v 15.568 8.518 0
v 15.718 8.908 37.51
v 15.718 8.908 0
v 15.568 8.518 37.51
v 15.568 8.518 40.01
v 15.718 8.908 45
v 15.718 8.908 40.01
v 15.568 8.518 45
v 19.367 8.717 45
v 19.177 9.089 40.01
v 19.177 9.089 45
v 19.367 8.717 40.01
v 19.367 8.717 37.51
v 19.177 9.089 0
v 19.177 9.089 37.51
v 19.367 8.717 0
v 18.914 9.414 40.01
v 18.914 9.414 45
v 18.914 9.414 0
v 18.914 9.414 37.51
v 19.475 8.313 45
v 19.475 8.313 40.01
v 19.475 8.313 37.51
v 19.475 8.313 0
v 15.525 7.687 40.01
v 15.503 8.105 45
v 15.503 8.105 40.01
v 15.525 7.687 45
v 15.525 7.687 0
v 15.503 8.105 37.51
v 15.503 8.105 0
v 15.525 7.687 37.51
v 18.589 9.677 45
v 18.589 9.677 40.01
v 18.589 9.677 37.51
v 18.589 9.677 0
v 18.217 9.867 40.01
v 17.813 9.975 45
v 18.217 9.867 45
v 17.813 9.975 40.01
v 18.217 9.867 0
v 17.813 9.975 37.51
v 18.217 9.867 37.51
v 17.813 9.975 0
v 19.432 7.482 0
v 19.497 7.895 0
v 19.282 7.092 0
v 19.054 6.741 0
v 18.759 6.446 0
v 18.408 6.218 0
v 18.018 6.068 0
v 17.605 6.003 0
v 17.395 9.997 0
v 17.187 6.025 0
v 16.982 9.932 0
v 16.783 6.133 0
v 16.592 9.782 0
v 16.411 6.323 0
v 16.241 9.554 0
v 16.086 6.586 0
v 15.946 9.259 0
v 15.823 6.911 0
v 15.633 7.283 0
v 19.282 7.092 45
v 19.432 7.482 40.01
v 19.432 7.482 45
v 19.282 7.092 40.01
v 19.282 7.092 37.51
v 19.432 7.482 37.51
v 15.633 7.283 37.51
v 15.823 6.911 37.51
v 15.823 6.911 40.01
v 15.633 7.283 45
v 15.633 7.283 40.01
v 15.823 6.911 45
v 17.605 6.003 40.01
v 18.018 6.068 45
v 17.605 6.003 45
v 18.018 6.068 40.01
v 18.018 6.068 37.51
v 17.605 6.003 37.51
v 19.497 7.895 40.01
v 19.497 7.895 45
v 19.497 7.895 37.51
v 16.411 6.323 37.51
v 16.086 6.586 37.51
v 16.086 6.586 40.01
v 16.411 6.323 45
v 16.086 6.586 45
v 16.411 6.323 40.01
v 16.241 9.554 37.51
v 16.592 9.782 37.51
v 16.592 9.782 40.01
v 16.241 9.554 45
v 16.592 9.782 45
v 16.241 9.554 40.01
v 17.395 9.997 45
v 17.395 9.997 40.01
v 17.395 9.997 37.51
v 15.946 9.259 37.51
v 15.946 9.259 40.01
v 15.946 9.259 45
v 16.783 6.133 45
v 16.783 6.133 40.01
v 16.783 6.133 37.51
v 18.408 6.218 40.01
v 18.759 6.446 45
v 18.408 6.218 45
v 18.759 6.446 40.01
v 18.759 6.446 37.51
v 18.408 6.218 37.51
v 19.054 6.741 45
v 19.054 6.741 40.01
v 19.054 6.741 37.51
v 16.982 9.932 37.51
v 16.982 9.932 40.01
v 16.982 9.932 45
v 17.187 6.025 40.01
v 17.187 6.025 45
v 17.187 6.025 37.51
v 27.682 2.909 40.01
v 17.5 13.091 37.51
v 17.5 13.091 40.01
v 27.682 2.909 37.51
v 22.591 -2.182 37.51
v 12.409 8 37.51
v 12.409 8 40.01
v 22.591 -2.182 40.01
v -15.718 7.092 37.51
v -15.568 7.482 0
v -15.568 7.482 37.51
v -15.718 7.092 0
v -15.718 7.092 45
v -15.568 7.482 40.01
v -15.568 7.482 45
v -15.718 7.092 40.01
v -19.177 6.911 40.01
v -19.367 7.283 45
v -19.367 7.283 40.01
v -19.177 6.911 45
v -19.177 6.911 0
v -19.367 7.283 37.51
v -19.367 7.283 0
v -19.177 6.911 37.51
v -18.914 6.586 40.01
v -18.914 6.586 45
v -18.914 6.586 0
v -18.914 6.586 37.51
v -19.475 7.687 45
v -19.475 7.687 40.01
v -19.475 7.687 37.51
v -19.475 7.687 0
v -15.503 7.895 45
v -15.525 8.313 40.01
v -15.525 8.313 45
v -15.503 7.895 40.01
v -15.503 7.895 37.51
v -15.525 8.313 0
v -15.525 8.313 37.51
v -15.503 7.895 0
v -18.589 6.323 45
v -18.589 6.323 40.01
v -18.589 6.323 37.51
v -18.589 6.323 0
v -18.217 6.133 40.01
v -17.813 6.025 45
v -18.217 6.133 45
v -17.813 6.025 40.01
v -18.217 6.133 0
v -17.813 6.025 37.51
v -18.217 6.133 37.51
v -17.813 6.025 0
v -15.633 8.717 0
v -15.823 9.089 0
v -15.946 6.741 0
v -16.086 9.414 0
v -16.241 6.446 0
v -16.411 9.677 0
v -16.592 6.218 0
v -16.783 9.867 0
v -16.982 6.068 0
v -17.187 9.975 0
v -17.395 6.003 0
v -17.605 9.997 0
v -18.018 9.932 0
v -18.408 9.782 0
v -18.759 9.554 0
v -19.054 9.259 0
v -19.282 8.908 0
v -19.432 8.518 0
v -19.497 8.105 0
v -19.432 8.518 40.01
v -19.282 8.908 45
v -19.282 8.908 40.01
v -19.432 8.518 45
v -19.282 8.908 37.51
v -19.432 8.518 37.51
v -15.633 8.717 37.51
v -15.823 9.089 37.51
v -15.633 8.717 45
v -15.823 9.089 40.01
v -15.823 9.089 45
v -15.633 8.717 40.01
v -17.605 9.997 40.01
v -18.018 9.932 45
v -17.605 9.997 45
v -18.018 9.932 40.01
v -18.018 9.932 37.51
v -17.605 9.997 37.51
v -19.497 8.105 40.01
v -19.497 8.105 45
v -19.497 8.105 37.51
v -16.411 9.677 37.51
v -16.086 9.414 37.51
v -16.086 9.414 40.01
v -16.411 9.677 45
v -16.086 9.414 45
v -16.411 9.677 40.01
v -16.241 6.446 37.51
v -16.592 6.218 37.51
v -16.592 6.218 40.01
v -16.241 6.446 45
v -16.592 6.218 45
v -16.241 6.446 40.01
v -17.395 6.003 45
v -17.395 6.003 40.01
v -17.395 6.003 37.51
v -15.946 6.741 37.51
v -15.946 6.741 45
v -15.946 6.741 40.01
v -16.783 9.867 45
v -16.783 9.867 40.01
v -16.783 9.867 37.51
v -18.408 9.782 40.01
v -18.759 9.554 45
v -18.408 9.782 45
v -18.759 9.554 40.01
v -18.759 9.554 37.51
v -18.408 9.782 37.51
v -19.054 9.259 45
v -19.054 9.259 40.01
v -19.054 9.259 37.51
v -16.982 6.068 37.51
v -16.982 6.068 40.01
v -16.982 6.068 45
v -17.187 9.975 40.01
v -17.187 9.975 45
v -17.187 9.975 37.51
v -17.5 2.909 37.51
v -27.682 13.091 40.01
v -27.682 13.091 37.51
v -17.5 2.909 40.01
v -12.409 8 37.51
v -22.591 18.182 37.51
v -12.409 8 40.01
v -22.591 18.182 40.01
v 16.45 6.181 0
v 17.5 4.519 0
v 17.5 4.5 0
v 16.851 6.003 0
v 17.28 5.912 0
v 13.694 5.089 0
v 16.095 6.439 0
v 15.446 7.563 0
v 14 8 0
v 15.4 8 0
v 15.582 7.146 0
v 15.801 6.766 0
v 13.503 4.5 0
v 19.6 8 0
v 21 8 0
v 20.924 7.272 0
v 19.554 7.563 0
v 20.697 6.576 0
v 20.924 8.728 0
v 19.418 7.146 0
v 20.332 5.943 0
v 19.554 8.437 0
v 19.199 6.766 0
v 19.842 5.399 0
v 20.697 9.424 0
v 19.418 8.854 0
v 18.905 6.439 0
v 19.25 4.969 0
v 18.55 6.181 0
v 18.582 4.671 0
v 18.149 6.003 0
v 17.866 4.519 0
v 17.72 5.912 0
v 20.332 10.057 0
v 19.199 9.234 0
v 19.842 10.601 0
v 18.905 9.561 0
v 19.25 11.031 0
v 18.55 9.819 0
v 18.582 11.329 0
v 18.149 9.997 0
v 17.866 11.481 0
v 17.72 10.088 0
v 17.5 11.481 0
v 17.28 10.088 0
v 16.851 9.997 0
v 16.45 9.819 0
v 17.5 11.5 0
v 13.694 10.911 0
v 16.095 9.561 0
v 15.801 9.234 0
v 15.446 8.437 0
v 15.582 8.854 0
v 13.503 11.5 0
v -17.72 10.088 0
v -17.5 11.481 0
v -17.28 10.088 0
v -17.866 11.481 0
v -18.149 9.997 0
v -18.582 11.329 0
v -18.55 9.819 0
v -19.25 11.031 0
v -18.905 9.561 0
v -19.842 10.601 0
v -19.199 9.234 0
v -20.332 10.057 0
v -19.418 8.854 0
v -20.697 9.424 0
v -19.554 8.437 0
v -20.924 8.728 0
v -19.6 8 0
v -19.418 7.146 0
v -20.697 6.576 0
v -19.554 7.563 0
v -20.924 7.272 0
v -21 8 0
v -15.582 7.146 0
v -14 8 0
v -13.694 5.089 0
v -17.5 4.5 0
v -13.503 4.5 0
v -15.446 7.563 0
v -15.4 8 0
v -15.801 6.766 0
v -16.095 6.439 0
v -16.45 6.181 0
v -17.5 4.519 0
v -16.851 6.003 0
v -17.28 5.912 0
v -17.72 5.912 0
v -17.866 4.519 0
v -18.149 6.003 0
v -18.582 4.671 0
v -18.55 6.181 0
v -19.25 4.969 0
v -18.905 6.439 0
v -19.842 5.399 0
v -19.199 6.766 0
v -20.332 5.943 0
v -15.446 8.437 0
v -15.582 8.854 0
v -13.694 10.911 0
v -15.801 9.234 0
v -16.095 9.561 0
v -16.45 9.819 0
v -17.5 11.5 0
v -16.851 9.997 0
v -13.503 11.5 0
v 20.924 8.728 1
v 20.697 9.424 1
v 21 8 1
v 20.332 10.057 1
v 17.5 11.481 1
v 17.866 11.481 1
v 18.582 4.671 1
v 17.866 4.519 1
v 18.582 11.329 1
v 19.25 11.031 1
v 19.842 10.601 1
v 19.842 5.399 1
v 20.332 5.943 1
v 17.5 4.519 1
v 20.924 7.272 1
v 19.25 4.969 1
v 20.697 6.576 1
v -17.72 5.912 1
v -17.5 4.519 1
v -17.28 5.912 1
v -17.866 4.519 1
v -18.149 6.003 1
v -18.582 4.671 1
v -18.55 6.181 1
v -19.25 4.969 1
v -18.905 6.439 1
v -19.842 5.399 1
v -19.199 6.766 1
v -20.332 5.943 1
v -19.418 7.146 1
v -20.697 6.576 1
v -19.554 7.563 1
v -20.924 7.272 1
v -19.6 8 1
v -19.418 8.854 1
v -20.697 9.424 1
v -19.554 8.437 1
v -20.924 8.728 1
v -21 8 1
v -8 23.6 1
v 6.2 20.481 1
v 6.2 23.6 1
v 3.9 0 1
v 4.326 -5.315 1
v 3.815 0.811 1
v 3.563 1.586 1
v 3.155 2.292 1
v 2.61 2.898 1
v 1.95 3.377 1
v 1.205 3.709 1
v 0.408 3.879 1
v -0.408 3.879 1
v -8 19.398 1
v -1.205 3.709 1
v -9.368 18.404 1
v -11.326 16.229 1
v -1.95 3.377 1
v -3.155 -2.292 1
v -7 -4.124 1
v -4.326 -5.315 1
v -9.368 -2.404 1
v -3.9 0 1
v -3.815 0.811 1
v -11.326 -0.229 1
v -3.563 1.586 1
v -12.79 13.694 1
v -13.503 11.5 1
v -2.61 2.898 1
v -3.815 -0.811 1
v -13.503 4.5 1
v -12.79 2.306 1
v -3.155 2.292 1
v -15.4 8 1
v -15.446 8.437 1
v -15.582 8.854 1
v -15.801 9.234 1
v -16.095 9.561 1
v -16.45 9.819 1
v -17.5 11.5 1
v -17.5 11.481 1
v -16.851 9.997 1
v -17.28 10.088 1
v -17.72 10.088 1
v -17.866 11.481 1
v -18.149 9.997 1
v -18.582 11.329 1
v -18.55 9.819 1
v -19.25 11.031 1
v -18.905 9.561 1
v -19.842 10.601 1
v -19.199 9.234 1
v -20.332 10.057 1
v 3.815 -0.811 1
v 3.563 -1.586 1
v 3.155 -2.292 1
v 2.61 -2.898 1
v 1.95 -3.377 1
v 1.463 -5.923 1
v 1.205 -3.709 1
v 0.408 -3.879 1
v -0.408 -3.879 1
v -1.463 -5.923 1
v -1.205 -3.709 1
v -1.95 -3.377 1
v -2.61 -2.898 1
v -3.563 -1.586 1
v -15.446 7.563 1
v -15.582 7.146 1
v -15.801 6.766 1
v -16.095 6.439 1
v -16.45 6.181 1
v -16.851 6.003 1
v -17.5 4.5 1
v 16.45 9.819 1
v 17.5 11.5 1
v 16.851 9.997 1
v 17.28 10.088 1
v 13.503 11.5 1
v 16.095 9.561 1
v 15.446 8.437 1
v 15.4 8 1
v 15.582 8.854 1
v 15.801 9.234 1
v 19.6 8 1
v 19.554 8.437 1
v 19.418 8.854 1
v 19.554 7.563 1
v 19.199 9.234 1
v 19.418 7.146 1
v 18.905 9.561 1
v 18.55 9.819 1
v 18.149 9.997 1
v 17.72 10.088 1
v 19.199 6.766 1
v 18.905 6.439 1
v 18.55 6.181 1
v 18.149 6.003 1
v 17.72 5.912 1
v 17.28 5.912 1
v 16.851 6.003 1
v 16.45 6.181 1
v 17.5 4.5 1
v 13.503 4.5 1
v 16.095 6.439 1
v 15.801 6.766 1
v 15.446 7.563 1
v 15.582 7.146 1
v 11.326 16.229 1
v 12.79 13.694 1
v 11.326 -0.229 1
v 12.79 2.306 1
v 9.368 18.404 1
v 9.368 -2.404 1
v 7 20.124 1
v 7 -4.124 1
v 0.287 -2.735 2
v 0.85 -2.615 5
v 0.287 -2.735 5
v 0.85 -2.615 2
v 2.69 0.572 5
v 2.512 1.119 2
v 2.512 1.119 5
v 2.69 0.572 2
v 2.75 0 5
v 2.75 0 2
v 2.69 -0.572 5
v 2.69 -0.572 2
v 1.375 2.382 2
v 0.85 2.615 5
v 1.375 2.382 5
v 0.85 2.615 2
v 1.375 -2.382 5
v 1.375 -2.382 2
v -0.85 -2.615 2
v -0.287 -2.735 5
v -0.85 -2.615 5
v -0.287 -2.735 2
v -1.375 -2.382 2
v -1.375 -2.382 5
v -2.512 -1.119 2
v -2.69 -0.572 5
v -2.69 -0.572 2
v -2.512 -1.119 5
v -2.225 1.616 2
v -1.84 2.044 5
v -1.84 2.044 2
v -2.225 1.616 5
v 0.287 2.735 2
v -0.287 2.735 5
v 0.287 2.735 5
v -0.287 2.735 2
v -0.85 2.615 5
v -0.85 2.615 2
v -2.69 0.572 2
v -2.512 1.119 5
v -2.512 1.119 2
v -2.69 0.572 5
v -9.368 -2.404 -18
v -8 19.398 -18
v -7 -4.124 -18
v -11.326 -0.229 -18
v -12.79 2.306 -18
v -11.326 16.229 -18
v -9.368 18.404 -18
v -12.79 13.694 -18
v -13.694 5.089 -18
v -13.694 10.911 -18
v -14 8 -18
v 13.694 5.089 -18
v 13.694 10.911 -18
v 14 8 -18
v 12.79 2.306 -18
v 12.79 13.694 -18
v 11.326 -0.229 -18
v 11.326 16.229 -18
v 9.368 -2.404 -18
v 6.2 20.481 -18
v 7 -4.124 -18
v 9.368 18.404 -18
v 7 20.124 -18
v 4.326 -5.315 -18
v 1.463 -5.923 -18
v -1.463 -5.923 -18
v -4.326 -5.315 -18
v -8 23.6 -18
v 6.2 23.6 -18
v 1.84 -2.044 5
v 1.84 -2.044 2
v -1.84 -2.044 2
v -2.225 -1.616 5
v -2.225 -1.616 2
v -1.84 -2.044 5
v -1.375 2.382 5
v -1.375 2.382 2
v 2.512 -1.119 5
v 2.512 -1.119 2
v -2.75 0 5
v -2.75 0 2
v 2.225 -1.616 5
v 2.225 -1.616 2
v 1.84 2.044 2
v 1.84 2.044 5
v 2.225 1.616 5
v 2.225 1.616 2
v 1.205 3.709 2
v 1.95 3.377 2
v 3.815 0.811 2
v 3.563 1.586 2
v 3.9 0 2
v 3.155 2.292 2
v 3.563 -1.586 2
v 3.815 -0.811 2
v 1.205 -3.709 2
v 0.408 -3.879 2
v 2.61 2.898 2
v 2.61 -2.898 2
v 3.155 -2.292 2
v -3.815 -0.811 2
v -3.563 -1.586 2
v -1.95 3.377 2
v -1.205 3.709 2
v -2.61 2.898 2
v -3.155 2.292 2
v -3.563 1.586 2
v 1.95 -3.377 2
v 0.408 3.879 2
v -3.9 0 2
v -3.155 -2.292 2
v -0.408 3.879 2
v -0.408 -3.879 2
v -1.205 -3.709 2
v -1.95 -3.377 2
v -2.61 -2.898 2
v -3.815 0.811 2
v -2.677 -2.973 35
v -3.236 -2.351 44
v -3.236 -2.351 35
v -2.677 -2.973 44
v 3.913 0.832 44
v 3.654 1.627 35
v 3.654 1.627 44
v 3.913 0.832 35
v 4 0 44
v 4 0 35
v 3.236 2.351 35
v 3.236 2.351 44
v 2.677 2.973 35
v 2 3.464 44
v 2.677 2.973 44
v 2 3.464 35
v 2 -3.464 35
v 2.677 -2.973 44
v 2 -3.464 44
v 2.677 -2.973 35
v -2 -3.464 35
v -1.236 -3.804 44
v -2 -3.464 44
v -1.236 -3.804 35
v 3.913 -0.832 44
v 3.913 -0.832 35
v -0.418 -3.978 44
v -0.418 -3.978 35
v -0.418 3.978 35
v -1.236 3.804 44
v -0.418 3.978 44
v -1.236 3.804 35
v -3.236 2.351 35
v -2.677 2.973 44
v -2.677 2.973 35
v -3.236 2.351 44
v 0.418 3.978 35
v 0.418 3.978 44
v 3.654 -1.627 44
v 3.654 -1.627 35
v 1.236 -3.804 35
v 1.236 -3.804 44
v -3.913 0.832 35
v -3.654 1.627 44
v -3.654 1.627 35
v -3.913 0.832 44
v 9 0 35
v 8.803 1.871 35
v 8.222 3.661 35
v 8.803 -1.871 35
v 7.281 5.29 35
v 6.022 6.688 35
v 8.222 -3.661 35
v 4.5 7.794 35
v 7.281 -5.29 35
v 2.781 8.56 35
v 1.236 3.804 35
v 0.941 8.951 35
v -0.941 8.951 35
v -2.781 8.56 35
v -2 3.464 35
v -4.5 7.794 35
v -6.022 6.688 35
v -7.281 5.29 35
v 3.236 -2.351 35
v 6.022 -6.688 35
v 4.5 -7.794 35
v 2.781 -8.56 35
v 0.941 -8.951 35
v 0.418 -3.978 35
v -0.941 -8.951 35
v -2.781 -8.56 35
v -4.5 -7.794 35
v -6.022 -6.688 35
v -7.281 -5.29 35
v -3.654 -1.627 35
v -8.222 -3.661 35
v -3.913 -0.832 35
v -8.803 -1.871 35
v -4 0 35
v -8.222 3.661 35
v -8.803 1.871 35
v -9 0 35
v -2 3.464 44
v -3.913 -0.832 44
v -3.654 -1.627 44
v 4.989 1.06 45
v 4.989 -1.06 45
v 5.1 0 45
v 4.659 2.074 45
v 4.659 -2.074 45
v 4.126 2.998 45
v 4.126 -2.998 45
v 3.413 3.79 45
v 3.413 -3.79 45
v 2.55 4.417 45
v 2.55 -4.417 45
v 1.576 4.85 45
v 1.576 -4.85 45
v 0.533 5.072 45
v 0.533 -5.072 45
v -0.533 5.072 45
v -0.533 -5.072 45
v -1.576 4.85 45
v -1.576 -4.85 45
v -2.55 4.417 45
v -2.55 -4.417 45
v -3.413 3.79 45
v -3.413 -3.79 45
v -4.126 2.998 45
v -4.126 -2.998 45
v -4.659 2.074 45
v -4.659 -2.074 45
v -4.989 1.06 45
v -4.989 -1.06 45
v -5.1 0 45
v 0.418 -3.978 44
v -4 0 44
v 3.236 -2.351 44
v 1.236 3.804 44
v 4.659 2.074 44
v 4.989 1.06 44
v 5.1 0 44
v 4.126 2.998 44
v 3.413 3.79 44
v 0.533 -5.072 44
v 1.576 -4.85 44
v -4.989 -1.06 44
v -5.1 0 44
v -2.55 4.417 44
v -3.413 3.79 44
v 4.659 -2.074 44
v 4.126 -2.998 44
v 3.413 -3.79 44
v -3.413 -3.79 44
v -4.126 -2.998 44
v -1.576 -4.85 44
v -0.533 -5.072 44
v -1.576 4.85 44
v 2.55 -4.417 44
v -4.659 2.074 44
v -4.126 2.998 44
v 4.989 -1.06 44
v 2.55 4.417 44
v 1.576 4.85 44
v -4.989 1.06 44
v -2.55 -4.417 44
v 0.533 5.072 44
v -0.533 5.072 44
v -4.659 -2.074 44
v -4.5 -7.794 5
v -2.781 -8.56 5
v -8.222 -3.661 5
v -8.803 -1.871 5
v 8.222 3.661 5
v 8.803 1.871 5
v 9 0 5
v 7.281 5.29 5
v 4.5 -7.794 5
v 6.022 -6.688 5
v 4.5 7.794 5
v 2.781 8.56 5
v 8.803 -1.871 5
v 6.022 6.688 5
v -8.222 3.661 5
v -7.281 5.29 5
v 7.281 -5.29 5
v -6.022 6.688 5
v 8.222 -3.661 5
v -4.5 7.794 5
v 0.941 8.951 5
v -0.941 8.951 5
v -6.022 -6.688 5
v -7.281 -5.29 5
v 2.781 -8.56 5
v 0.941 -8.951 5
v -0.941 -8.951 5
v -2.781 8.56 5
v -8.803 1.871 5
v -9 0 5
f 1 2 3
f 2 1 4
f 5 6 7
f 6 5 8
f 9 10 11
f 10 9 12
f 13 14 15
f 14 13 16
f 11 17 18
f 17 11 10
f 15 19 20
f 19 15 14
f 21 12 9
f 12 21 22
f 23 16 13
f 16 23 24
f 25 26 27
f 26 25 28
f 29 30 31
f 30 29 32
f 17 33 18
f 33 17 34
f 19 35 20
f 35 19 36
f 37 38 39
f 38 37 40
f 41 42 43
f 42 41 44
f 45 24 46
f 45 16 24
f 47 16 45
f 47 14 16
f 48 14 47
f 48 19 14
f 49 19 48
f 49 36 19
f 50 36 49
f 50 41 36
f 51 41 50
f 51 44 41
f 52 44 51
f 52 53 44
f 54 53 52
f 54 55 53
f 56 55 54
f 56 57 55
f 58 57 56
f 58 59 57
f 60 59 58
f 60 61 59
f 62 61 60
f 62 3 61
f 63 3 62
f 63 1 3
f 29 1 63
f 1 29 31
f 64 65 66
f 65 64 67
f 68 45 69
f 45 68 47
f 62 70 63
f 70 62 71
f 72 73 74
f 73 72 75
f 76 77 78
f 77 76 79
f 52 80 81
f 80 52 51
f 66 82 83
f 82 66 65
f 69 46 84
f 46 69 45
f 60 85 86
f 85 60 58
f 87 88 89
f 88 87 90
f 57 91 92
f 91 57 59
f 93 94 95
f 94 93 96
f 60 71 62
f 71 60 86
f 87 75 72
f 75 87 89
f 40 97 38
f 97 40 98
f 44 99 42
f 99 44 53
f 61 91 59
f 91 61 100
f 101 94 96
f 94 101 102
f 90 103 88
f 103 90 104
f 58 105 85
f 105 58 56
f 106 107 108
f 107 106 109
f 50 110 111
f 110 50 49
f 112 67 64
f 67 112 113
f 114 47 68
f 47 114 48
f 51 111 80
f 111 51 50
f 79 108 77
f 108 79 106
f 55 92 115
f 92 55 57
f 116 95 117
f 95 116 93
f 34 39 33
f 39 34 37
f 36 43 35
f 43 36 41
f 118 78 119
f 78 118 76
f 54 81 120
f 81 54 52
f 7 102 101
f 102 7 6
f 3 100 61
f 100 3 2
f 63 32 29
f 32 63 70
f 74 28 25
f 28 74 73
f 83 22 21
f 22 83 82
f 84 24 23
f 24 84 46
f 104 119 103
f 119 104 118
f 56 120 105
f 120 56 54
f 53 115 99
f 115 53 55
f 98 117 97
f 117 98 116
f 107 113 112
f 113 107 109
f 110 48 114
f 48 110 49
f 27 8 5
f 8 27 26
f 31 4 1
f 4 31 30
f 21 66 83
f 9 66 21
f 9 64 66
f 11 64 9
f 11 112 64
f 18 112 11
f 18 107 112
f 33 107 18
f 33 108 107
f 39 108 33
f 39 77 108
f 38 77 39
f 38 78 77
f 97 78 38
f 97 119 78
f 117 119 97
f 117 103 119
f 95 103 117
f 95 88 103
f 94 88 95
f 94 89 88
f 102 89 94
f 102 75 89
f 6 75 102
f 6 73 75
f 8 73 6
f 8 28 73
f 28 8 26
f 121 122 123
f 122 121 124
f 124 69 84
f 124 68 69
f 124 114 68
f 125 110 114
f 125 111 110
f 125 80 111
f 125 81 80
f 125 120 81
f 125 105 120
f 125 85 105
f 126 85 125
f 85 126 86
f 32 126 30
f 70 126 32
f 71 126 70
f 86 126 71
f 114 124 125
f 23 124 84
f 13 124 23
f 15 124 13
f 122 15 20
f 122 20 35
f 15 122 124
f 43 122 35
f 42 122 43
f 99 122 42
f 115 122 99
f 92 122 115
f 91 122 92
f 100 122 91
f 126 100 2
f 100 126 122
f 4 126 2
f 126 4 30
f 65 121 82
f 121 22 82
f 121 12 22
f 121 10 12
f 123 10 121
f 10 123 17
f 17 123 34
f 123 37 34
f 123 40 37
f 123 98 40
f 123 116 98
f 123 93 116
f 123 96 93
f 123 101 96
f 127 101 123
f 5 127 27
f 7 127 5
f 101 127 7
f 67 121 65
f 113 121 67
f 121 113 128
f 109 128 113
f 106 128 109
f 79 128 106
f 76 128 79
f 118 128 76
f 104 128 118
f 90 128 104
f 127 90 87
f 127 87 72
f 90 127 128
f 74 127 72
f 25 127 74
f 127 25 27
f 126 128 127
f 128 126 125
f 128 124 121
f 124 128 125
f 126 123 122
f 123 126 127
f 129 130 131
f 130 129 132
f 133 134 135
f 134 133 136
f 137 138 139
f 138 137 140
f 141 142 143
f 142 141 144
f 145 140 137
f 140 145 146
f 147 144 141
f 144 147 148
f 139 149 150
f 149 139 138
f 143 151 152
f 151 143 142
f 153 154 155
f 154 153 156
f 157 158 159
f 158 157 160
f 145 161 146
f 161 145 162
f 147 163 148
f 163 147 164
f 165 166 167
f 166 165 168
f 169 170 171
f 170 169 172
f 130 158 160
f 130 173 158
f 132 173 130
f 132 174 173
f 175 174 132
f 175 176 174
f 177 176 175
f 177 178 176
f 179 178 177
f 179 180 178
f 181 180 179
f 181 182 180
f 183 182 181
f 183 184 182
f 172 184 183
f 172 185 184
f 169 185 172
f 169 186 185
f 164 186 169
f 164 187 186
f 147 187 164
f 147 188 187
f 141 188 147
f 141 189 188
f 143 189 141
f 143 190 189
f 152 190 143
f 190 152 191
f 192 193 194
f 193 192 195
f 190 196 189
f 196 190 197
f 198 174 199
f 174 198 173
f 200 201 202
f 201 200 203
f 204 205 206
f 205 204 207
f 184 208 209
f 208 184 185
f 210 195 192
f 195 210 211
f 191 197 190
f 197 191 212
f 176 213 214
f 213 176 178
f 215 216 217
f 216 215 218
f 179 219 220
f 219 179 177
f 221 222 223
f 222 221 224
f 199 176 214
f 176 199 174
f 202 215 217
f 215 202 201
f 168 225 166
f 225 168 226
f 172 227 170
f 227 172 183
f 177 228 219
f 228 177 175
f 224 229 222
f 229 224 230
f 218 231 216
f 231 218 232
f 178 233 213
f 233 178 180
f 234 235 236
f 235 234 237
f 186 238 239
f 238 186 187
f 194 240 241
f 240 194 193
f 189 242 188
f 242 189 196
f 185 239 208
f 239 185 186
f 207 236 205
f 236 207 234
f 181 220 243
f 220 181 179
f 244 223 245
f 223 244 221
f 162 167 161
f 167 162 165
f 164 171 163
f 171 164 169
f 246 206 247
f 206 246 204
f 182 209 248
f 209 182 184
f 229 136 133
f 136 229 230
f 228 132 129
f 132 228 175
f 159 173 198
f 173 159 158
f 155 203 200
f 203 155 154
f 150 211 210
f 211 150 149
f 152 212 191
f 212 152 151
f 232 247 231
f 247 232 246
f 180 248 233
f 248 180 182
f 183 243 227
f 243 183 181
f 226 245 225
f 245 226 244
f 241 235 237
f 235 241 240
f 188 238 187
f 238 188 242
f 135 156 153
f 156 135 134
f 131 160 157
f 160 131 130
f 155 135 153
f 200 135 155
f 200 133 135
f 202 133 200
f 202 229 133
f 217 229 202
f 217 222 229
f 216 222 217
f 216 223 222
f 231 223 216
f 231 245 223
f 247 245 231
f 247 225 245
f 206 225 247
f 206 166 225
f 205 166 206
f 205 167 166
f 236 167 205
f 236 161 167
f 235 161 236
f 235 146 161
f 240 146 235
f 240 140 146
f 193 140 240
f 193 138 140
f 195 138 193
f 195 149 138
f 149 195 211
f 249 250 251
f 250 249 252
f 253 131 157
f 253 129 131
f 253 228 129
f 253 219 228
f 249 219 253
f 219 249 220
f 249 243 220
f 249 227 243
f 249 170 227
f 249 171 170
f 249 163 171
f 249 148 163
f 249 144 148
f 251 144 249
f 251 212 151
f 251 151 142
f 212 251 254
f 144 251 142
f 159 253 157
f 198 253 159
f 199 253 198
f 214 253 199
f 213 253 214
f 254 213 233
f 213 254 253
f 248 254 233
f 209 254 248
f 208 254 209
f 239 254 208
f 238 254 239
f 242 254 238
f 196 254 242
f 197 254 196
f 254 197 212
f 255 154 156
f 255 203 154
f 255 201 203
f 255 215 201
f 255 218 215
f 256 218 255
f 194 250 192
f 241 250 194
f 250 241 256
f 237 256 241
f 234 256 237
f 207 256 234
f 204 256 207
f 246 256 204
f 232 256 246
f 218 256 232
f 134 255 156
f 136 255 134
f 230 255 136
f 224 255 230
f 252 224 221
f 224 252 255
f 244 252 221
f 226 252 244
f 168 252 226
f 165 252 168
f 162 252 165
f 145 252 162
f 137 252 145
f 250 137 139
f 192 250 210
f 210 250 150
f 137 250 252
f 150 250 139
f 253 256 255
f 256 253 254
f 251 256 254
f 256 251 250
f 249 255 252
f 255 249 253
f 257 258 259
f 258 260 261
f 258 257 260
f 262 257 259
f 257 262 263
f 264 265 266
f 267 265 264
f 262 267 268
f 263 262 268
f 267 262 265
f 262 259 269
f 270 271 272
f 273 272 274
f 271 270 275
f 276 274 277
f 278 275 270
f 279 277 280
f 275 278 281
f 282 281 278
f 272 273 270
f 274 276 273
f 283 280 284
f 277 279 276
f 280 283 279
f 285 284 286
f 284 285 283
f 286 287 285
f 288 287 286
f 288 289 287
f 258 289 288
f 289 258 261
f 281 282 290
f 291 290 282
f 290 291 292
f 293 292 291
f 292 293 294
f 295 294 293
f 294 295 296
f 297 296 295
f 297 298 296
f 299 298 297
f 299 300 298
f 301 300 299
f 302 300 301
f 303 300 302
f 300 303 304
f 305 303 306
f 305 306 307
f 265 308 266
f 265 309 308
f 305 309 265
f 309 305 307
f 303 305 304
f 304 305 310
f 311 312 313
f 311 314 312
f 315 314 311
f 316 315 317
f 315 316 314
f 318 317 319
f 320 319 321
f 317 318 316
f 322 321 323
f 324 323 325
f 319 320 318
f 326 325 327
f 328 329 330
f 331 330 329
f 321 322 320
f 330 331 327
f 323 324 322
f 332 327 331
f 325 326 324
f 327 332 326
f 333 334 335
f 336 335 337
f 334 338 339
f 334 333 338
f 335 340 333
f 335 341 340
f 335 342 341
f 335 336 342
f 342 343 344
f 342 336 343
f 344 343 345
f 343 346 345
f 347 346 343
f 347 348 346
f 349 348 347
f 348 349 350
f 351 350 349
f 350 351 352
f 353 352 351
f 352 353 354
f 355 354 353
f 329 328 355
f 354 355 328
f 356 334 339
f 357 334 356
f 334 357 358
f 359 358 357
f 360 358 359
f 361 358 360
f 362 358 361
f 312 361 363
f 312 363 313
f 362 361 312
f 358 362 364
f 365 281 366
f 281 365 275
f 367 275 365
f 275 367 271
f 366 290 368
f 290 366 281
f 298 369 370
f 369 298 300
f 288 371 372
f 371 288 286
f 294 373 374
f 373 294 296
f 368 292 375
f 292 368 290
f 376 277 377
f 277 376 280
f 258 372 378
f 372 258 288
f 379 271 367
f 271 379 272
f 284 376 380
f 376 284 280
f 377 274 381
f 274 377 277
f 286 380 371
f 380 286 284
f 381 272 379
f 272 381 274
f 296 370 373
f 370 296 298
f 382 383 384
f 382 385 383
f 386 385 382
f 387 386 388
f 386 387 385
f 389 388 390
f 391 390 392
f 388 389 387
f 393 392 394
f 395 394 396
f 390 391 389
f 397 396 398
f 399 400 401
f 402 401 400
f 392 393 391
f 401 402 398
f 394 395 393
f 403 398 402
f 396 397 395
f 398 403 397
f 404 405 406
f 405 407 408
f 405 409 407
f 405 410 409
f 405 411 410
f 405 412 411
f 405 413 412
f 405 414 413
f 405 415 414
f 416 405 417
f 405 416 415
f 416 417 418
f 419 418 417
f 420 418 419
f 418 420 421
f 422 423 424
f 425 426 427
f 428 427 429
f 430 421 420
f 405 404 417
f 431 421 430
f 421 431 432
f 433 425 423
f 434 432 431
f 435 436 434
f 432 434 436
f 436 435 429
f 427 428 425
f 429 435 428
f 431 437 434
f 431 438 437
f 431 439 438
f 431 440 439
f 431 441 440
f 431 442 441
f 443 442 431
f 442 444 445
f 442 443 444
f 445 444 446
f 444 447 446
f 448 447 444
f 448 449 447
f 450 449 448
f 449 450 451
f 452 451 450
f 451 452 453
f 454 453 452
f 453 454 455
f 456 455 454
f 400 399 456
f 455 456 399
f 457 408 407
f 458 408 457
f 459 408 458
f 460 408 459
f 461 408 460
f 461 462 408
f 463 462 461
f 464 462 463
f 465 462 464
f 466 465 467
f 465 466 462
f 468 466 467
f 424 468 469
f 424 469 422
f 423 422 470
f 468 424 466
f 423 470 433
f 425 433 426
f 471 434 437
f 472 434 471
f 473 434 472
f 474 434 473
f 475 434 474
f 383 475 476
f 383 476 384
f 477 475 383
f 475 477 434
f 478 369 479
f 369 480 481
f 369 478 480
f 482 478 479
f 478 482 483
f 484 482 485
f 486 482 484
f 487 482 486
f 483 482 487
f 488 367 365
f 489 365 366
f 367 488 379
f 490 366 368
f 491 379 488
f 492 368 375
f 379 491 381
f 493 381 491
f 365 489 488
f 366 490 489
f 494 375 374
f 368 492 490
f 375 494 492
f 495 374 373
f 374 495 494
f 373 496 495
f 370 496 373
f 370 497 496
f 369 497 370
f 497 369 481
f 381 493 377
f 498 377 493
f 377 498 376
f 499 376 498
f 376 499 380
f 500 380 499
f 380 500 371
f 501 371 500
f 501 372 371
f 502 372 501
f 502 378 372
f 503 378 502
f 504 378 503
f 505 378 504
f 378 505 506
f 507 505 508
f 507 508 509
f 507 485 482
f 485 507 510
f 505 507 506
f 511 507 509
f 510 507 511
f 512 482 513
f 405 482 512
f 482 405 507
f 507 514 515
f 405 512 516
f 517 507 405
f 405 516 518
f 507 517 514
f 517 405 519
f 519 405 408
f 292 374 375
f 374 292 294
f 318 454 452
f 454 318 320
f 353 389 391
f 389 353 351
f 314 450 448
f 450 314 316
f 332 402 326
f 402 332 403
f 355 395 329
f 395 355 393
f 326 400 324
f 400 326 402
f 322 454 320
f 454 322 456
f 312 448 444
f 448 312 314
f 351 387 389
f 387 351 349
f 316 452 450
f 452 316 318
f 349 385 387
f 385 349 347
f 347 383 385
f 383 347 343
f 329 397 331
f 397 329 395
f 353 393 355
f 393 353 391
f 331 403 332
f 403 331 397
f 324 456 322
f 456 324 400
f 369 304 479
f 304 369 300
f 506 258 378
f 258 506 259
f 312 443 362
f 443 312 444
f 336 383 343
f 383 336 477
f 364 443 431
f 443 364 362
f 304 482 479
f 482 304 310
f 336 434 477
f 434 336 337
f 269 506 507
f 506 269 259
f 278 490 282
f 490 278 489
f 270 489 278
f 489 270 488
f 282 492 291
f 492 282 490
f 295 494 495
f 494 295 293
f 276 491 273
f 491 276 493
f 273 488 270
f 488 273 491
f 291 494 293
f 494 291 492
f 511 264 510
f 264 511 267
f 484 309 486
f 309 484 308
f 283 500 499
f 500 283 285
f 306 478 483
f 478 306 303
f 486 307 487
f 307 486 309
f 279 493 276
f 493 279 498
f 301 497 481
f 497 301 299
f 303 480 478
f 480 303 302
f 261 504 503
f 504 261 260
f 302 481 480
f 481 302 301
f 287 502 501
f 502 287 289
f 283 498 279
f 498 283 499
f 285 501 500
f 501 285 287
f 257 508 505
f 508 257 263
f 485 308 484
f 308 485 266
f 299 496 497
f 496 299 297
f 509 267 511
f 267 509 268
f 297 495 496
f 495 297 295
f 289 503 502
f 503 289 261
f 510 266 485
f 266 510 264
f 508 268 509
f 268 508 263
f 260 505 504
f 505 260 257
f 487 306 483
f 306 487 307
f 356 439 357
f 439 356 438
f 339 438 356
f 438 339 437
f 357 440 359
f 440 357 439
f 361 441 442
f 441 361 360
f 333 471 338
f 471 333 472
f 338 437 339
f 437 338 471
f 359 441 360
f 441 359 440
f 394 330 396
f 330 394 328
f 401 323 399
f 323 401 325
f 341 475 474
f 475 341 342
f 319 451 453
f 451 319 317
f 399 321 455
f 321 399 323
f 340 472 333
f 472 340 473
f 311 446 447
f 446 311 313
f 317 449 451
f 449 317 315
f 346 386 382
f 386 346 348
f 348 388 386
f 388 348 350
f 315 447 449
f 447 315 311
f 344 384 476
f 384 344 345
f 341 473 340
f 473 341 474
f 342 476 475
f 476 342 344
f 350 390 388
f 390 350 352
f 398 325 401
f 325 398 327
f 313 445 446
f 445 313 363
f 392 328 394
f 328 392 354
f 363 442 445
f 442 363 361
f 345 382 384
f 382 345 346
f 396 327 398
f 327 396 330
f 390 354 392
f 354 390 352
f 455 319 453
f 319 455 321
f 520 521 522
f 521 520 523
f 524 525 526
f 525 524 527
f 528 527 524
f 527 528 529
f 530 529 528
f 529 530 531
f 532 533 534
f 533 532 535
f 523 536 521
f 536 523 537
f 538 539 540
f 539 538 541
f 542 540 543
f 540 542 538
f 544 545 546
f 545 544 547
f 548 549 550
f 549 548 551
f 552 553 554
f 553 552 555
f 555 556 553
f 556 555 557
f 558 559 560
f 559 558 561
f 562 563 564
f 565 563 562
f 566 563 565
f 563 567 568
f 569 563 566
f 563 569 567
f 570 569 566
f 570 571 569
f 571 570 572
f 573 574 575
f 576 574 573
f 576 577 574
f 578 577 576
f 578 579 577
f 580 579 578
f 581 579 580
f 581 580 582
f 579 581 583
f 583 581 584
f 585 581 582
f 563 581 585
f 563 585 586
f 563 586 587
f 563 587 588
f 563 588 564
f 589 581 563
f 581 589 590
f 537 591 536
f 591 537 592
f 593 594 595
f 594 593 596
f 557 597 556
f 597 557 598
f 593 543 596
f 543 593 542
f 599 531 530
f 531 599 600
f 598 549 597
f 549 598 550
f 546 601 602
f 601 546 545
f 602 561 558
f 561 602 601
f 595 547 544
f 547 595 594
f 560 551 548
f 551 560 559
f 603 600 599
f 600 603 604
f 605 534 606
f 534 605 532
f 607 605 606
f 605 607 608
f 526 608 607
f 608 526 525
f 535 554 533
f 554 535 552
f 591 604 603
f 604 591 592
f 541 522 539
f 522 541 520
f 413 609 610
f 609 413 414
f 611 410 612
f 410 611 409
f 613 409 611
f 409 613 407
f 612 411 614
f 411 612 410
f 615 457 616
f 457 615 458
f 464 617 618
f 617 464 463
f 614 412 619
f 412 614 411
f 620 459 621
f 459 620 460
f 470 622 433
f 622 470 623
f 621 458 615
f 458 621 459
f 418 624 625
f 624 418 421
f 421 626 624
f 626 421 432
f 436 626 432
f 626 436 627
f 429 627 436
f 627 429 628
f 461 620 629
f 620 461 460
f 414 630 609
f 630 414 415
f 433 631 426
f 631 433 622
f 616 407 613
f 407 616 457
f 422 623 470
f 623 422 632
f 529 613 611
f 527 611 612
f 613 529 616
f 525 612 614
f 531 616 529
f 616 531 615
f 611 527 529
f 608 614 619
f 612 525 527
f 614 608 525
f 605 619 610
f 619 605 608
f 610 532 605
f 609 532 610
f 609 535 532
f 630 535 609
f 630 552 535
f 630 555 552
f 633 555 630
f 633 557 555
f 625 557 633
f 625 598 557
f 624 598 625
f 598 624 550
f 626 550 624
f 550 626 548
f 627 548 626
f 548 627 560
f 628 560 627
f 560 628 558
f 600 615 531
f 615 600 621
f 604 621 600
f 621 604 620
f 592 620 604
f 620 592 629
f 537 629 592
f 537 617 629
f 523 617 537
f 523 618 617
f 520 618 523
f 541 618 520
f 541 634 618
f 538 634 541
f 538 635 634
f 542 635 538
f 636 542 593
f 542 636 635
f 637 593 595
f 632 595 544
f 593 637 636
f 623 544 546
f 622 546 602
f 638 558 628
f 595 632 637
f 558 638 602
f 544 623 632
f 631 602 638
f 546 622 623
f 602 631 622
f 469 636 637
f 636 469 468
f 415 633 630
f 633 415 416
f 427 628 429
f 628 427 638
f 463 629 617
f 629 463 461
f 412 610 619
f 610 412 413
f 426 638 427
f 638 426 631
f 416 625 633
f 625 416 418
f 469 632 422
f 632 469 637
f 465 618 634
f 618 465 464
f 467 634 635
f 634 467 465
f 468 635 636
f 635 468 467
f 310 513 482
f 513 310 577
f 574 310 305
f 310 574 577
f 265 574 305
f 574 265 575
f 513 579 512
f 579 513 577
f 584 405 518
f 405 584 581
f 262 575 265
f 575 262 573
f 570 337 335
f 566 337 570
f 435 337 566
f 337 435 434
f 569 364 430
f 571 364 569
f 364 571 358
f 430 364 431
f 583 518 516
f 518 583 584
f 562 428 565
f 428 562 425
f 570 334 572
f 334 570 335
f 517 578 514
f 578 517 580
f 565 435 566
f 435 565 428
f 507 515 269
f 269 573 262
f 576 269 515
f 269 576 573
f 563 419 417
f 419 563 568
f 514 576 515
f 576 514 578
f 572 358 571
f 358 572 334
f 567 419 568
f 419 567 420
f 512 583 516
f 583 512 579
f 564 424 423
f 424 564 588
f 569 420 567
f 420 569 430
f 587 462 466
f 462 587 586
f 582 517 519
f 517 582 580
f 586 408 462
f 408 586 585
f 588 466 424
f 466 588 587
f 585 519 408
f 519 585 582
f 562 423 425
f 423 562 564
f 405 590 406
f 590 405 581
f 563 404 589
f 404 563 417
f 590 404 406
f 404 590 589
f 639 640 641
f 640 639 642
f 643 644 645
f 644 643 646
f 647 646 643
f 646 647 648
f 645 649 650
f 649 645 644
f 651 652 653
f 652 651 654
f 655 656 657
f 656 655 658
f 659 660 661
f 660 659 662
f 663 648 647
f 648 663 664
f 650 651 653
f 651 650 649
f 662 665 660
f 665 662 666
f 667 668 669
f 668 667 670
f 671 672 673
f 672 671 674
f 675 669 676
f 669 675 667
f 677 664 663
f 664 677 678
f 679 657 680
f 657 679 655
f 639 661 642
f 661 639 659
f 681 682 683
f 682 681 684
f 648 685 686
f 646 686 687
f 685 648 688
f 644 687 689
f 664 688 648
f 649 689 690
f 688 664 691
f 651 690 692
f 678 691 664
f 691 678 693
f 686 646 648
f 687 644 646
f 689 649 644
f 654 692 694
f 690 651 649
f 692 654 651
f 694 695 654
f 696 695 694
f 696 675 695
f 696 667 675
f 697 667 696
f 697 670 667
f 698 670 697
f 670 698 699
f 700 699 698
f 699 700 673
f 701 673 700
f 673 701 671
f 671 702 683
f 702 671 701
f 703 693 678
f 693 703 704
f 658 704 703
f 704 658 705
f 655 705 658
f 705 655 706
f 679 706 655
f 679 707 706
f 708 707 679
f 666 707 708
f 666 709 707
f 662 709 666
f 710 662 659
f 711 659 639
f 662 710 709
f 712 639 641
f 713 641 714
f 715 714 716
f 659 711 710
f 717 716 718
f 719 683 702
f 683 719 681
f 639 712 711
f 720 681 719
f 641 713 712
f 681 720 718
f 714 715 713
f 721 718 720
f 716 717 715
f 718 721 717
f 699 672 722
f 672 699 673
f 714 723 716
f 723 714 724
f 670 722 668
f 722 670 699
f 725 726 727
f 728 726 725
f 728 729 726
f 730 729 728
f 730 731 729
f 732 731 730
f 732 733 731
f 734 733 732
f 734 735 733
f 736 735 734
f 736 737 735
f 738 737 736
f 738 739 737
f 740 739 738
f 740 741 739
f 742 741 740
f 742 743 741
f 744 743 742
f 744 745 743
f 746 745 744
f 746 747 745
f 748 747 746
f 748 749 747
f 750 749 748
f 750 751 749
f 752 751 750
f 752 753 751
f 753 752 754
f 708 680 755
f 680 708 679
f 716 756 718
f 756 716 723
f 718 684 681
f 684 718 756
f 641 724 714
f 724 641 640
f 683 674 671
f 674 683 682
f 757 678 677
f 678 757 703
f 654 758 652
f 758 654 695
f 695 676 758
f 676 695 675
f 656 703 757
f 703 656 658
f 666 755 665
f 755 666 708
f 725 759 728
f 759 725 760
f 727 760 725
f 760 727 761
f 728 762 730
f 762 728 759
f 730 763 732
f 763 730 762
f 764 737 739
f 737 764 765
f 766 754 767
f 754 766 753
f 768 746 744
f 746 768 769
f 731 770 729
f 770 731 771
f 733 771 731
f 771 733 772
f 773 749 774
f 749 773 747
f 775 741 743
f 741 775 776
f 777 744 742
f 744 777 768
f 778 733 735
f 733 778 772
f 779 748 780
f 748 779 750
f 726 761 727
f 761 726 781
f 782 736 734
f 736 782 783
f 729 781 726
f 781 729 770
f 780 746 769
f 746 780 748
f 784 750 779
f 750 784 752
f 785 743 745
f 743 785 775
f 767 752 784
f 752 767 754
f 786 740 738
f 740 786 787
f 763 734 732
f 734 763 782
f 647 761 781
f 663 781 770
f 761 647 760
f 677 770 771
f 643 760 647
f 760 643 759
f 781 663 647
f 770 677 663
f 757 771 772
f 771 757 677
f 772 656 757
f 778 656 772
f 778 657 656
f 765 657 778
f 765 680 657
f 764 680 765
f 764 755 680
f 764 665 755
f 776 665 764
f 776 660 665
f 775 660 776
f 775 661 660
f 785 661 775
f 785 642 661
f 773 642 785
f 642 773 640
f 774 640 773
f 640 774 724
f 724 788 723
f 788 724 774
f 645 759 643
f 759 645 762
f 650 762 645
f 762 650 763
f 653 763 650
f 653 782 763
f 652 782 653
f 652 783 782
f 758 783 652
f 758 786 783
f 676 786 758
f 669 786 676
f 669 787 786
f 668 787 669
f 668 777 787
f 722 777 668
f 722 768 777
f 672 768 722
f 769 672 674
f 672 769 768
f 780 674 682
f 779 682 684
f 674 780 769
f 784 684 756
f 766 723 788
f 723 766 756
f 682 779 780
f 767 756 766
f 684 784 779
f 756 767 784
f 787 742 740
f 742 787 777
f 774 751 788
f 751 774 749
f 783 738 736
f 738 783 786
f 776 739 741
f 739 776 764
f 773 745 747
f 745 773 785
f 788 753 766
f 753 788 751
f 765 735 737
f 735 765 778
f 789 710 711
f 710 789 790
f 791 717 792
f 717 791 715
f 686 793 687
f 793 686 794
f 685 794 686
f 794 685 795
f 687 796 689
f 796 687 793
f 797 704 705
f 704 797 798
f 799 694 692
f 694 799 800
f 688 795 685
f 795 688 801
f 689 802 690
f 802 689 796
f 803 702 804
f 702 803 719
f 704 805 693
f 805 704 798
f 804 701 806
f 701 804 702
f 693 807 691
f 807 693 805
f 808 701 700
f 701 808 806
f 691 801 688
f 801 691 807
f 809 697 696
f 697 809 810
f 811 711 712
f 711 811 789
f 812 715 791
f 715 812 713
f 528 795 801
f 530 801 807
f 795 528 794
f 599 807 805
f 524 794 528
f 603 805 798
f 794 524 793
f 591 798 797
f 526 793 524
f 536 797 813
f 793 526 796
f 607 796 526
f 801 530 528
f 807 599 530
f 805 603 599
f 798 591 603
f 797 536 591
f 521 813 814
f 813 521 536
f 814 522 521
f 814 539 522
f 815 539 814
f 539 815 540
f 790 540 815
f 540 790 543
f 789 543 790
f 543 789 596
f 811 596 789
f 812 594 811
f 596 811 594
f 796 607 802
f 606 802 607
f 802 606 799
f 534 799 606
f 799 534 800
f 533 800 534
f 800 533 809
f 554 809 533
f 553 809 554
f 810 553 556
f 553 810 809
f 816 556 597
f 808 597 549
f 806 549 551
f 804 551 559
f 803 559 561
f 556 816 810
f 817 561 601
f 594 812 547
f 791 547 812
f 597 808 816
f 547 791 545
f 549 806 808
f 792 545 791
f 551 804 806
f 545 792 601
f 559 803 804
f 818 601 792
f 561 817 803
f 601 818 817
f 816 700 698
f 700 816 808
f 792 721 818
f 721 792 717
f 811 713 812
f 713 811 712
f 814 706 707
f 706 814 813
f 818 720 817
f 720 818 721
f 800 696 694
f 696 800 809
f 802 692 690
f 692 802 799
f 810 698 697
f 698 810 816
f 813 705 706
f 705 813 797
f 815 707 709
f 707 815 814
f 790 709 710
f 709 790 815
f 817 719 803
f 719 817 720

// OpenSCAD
module coupler(){
	difference(){
		translate([0,0,10])
		cylinder(h=10,r=6,center=true,$fn=res); // coupler space
		translate([0,0,16])
		cylinder(h=10,r=4.25,center=true,$fn=6); // coupler space
		stepper_mounted(screw=0);
	}
}

module couplerKM200(){
	difference(){
		translate([0,0,13])
		cylinder(h=15,r=10,center=true,$fn=res); // coupler space
		translate([0,0,18])
		cylinder(h=15,r=15/2,center=true,$fn=res); // coupler space
		stepper_mounted(screw=0);
	}
}

module stepper_mounted(n_l=45,n_d=5,n_rot1=45,n_rot2=-135,n_w=7.2,n_z=2.5,screw_w=4,screw=2,res=30,scaling=1){
module 24byj48() {
	scaling=1.1;//scaling for 3d print fit
	//body
	cylinder(h=19,d=28,center=false,$fn=res);
	translate([-8,0,0])
	cube([14.2,15.6,19]);

	//mount tabs
	difference(){
		union(){
			translate([17.5,0,18])
			cylinder(h=1,d=7,center=false,$fn=res);
			translate([-17.5,0,18])
			cylinder(h=1,d=7,center=false,$fn=res);
			translate([0,0,18.5])
			cube([35,7,1],center=true);
		}
		translate([17.5,0,17.5])
		cylinder(h=2,d=4.2,center=false,$fn=res);
		translate([-17.5,0,17.5])
		cylinder(h=2,d=4.2,center=false,$fn=res);
	}
	
	
	//shaft
	translate([0,-8,0]){
		cylinder(h=20,d=7.8,center=false,$fn=res);
		difference(){
			cylinder(h=29,d=5*scaling,center=false,$fn=res);
			translate([0,0,26.01])
			difference(){
				cube([15,10,6],center=true);
				cube([10,3*scaling,6],center=true);
			}
		}
	}
}

module screw_nut_uncut(nut_depth, nut_length,nut_thick) {
	cylinder(h=nut_length,d=screw_w,center=false,$fn=res);
	translate([0,n_w/2,nut_depth+nut_thick/2-0.01])
	cube(size=[n_w,n_w*2,nut_thick], center=true);
}

module micrometer_screw(){
	translate([0,0,16])
	cylinder(h=10,d=12,center=true,$fn=res);
	translate([0,0,14+6+10])
	cylinder(h=28,d=6,center=true,$fn=res);
	translate([0,0,40])
	cylinder(h=10,d=8.0,center=true,$fn=res);
	translate([0,0,44.5])
	cylinder(h=1,d=10.2,center=true,$fn=res);
	translate([0,0,20])
	cylinder(h=30,d=18,center=true,$fn=res); // coupler space
}

module m4_screw(){
	translate([0,0,20])
	cylinder(h=20,d=5,center=true,$fn=res); // coupler space
	translate([0,0,28])
	rotate([0,0,45])
	cube([7.2,7.2,4],center=true);
}

//mounting screws

translate([17.5,8,n_l])
rotate([180,0,n_rot1])
screw_nut_uncut(n_d,n_l,n_z);
translate([-17.5,8,n_l])
rotate([180,0,n_rot2])
screw_nut_uncut(n_d,n_l,n_z);

translate([0,8,-18])
24byj48();

if(screw==1){
	micrometer_screw();
}
if(screw==2){
	m4_screw();
}
}
stepper_mounted(screw=1);
